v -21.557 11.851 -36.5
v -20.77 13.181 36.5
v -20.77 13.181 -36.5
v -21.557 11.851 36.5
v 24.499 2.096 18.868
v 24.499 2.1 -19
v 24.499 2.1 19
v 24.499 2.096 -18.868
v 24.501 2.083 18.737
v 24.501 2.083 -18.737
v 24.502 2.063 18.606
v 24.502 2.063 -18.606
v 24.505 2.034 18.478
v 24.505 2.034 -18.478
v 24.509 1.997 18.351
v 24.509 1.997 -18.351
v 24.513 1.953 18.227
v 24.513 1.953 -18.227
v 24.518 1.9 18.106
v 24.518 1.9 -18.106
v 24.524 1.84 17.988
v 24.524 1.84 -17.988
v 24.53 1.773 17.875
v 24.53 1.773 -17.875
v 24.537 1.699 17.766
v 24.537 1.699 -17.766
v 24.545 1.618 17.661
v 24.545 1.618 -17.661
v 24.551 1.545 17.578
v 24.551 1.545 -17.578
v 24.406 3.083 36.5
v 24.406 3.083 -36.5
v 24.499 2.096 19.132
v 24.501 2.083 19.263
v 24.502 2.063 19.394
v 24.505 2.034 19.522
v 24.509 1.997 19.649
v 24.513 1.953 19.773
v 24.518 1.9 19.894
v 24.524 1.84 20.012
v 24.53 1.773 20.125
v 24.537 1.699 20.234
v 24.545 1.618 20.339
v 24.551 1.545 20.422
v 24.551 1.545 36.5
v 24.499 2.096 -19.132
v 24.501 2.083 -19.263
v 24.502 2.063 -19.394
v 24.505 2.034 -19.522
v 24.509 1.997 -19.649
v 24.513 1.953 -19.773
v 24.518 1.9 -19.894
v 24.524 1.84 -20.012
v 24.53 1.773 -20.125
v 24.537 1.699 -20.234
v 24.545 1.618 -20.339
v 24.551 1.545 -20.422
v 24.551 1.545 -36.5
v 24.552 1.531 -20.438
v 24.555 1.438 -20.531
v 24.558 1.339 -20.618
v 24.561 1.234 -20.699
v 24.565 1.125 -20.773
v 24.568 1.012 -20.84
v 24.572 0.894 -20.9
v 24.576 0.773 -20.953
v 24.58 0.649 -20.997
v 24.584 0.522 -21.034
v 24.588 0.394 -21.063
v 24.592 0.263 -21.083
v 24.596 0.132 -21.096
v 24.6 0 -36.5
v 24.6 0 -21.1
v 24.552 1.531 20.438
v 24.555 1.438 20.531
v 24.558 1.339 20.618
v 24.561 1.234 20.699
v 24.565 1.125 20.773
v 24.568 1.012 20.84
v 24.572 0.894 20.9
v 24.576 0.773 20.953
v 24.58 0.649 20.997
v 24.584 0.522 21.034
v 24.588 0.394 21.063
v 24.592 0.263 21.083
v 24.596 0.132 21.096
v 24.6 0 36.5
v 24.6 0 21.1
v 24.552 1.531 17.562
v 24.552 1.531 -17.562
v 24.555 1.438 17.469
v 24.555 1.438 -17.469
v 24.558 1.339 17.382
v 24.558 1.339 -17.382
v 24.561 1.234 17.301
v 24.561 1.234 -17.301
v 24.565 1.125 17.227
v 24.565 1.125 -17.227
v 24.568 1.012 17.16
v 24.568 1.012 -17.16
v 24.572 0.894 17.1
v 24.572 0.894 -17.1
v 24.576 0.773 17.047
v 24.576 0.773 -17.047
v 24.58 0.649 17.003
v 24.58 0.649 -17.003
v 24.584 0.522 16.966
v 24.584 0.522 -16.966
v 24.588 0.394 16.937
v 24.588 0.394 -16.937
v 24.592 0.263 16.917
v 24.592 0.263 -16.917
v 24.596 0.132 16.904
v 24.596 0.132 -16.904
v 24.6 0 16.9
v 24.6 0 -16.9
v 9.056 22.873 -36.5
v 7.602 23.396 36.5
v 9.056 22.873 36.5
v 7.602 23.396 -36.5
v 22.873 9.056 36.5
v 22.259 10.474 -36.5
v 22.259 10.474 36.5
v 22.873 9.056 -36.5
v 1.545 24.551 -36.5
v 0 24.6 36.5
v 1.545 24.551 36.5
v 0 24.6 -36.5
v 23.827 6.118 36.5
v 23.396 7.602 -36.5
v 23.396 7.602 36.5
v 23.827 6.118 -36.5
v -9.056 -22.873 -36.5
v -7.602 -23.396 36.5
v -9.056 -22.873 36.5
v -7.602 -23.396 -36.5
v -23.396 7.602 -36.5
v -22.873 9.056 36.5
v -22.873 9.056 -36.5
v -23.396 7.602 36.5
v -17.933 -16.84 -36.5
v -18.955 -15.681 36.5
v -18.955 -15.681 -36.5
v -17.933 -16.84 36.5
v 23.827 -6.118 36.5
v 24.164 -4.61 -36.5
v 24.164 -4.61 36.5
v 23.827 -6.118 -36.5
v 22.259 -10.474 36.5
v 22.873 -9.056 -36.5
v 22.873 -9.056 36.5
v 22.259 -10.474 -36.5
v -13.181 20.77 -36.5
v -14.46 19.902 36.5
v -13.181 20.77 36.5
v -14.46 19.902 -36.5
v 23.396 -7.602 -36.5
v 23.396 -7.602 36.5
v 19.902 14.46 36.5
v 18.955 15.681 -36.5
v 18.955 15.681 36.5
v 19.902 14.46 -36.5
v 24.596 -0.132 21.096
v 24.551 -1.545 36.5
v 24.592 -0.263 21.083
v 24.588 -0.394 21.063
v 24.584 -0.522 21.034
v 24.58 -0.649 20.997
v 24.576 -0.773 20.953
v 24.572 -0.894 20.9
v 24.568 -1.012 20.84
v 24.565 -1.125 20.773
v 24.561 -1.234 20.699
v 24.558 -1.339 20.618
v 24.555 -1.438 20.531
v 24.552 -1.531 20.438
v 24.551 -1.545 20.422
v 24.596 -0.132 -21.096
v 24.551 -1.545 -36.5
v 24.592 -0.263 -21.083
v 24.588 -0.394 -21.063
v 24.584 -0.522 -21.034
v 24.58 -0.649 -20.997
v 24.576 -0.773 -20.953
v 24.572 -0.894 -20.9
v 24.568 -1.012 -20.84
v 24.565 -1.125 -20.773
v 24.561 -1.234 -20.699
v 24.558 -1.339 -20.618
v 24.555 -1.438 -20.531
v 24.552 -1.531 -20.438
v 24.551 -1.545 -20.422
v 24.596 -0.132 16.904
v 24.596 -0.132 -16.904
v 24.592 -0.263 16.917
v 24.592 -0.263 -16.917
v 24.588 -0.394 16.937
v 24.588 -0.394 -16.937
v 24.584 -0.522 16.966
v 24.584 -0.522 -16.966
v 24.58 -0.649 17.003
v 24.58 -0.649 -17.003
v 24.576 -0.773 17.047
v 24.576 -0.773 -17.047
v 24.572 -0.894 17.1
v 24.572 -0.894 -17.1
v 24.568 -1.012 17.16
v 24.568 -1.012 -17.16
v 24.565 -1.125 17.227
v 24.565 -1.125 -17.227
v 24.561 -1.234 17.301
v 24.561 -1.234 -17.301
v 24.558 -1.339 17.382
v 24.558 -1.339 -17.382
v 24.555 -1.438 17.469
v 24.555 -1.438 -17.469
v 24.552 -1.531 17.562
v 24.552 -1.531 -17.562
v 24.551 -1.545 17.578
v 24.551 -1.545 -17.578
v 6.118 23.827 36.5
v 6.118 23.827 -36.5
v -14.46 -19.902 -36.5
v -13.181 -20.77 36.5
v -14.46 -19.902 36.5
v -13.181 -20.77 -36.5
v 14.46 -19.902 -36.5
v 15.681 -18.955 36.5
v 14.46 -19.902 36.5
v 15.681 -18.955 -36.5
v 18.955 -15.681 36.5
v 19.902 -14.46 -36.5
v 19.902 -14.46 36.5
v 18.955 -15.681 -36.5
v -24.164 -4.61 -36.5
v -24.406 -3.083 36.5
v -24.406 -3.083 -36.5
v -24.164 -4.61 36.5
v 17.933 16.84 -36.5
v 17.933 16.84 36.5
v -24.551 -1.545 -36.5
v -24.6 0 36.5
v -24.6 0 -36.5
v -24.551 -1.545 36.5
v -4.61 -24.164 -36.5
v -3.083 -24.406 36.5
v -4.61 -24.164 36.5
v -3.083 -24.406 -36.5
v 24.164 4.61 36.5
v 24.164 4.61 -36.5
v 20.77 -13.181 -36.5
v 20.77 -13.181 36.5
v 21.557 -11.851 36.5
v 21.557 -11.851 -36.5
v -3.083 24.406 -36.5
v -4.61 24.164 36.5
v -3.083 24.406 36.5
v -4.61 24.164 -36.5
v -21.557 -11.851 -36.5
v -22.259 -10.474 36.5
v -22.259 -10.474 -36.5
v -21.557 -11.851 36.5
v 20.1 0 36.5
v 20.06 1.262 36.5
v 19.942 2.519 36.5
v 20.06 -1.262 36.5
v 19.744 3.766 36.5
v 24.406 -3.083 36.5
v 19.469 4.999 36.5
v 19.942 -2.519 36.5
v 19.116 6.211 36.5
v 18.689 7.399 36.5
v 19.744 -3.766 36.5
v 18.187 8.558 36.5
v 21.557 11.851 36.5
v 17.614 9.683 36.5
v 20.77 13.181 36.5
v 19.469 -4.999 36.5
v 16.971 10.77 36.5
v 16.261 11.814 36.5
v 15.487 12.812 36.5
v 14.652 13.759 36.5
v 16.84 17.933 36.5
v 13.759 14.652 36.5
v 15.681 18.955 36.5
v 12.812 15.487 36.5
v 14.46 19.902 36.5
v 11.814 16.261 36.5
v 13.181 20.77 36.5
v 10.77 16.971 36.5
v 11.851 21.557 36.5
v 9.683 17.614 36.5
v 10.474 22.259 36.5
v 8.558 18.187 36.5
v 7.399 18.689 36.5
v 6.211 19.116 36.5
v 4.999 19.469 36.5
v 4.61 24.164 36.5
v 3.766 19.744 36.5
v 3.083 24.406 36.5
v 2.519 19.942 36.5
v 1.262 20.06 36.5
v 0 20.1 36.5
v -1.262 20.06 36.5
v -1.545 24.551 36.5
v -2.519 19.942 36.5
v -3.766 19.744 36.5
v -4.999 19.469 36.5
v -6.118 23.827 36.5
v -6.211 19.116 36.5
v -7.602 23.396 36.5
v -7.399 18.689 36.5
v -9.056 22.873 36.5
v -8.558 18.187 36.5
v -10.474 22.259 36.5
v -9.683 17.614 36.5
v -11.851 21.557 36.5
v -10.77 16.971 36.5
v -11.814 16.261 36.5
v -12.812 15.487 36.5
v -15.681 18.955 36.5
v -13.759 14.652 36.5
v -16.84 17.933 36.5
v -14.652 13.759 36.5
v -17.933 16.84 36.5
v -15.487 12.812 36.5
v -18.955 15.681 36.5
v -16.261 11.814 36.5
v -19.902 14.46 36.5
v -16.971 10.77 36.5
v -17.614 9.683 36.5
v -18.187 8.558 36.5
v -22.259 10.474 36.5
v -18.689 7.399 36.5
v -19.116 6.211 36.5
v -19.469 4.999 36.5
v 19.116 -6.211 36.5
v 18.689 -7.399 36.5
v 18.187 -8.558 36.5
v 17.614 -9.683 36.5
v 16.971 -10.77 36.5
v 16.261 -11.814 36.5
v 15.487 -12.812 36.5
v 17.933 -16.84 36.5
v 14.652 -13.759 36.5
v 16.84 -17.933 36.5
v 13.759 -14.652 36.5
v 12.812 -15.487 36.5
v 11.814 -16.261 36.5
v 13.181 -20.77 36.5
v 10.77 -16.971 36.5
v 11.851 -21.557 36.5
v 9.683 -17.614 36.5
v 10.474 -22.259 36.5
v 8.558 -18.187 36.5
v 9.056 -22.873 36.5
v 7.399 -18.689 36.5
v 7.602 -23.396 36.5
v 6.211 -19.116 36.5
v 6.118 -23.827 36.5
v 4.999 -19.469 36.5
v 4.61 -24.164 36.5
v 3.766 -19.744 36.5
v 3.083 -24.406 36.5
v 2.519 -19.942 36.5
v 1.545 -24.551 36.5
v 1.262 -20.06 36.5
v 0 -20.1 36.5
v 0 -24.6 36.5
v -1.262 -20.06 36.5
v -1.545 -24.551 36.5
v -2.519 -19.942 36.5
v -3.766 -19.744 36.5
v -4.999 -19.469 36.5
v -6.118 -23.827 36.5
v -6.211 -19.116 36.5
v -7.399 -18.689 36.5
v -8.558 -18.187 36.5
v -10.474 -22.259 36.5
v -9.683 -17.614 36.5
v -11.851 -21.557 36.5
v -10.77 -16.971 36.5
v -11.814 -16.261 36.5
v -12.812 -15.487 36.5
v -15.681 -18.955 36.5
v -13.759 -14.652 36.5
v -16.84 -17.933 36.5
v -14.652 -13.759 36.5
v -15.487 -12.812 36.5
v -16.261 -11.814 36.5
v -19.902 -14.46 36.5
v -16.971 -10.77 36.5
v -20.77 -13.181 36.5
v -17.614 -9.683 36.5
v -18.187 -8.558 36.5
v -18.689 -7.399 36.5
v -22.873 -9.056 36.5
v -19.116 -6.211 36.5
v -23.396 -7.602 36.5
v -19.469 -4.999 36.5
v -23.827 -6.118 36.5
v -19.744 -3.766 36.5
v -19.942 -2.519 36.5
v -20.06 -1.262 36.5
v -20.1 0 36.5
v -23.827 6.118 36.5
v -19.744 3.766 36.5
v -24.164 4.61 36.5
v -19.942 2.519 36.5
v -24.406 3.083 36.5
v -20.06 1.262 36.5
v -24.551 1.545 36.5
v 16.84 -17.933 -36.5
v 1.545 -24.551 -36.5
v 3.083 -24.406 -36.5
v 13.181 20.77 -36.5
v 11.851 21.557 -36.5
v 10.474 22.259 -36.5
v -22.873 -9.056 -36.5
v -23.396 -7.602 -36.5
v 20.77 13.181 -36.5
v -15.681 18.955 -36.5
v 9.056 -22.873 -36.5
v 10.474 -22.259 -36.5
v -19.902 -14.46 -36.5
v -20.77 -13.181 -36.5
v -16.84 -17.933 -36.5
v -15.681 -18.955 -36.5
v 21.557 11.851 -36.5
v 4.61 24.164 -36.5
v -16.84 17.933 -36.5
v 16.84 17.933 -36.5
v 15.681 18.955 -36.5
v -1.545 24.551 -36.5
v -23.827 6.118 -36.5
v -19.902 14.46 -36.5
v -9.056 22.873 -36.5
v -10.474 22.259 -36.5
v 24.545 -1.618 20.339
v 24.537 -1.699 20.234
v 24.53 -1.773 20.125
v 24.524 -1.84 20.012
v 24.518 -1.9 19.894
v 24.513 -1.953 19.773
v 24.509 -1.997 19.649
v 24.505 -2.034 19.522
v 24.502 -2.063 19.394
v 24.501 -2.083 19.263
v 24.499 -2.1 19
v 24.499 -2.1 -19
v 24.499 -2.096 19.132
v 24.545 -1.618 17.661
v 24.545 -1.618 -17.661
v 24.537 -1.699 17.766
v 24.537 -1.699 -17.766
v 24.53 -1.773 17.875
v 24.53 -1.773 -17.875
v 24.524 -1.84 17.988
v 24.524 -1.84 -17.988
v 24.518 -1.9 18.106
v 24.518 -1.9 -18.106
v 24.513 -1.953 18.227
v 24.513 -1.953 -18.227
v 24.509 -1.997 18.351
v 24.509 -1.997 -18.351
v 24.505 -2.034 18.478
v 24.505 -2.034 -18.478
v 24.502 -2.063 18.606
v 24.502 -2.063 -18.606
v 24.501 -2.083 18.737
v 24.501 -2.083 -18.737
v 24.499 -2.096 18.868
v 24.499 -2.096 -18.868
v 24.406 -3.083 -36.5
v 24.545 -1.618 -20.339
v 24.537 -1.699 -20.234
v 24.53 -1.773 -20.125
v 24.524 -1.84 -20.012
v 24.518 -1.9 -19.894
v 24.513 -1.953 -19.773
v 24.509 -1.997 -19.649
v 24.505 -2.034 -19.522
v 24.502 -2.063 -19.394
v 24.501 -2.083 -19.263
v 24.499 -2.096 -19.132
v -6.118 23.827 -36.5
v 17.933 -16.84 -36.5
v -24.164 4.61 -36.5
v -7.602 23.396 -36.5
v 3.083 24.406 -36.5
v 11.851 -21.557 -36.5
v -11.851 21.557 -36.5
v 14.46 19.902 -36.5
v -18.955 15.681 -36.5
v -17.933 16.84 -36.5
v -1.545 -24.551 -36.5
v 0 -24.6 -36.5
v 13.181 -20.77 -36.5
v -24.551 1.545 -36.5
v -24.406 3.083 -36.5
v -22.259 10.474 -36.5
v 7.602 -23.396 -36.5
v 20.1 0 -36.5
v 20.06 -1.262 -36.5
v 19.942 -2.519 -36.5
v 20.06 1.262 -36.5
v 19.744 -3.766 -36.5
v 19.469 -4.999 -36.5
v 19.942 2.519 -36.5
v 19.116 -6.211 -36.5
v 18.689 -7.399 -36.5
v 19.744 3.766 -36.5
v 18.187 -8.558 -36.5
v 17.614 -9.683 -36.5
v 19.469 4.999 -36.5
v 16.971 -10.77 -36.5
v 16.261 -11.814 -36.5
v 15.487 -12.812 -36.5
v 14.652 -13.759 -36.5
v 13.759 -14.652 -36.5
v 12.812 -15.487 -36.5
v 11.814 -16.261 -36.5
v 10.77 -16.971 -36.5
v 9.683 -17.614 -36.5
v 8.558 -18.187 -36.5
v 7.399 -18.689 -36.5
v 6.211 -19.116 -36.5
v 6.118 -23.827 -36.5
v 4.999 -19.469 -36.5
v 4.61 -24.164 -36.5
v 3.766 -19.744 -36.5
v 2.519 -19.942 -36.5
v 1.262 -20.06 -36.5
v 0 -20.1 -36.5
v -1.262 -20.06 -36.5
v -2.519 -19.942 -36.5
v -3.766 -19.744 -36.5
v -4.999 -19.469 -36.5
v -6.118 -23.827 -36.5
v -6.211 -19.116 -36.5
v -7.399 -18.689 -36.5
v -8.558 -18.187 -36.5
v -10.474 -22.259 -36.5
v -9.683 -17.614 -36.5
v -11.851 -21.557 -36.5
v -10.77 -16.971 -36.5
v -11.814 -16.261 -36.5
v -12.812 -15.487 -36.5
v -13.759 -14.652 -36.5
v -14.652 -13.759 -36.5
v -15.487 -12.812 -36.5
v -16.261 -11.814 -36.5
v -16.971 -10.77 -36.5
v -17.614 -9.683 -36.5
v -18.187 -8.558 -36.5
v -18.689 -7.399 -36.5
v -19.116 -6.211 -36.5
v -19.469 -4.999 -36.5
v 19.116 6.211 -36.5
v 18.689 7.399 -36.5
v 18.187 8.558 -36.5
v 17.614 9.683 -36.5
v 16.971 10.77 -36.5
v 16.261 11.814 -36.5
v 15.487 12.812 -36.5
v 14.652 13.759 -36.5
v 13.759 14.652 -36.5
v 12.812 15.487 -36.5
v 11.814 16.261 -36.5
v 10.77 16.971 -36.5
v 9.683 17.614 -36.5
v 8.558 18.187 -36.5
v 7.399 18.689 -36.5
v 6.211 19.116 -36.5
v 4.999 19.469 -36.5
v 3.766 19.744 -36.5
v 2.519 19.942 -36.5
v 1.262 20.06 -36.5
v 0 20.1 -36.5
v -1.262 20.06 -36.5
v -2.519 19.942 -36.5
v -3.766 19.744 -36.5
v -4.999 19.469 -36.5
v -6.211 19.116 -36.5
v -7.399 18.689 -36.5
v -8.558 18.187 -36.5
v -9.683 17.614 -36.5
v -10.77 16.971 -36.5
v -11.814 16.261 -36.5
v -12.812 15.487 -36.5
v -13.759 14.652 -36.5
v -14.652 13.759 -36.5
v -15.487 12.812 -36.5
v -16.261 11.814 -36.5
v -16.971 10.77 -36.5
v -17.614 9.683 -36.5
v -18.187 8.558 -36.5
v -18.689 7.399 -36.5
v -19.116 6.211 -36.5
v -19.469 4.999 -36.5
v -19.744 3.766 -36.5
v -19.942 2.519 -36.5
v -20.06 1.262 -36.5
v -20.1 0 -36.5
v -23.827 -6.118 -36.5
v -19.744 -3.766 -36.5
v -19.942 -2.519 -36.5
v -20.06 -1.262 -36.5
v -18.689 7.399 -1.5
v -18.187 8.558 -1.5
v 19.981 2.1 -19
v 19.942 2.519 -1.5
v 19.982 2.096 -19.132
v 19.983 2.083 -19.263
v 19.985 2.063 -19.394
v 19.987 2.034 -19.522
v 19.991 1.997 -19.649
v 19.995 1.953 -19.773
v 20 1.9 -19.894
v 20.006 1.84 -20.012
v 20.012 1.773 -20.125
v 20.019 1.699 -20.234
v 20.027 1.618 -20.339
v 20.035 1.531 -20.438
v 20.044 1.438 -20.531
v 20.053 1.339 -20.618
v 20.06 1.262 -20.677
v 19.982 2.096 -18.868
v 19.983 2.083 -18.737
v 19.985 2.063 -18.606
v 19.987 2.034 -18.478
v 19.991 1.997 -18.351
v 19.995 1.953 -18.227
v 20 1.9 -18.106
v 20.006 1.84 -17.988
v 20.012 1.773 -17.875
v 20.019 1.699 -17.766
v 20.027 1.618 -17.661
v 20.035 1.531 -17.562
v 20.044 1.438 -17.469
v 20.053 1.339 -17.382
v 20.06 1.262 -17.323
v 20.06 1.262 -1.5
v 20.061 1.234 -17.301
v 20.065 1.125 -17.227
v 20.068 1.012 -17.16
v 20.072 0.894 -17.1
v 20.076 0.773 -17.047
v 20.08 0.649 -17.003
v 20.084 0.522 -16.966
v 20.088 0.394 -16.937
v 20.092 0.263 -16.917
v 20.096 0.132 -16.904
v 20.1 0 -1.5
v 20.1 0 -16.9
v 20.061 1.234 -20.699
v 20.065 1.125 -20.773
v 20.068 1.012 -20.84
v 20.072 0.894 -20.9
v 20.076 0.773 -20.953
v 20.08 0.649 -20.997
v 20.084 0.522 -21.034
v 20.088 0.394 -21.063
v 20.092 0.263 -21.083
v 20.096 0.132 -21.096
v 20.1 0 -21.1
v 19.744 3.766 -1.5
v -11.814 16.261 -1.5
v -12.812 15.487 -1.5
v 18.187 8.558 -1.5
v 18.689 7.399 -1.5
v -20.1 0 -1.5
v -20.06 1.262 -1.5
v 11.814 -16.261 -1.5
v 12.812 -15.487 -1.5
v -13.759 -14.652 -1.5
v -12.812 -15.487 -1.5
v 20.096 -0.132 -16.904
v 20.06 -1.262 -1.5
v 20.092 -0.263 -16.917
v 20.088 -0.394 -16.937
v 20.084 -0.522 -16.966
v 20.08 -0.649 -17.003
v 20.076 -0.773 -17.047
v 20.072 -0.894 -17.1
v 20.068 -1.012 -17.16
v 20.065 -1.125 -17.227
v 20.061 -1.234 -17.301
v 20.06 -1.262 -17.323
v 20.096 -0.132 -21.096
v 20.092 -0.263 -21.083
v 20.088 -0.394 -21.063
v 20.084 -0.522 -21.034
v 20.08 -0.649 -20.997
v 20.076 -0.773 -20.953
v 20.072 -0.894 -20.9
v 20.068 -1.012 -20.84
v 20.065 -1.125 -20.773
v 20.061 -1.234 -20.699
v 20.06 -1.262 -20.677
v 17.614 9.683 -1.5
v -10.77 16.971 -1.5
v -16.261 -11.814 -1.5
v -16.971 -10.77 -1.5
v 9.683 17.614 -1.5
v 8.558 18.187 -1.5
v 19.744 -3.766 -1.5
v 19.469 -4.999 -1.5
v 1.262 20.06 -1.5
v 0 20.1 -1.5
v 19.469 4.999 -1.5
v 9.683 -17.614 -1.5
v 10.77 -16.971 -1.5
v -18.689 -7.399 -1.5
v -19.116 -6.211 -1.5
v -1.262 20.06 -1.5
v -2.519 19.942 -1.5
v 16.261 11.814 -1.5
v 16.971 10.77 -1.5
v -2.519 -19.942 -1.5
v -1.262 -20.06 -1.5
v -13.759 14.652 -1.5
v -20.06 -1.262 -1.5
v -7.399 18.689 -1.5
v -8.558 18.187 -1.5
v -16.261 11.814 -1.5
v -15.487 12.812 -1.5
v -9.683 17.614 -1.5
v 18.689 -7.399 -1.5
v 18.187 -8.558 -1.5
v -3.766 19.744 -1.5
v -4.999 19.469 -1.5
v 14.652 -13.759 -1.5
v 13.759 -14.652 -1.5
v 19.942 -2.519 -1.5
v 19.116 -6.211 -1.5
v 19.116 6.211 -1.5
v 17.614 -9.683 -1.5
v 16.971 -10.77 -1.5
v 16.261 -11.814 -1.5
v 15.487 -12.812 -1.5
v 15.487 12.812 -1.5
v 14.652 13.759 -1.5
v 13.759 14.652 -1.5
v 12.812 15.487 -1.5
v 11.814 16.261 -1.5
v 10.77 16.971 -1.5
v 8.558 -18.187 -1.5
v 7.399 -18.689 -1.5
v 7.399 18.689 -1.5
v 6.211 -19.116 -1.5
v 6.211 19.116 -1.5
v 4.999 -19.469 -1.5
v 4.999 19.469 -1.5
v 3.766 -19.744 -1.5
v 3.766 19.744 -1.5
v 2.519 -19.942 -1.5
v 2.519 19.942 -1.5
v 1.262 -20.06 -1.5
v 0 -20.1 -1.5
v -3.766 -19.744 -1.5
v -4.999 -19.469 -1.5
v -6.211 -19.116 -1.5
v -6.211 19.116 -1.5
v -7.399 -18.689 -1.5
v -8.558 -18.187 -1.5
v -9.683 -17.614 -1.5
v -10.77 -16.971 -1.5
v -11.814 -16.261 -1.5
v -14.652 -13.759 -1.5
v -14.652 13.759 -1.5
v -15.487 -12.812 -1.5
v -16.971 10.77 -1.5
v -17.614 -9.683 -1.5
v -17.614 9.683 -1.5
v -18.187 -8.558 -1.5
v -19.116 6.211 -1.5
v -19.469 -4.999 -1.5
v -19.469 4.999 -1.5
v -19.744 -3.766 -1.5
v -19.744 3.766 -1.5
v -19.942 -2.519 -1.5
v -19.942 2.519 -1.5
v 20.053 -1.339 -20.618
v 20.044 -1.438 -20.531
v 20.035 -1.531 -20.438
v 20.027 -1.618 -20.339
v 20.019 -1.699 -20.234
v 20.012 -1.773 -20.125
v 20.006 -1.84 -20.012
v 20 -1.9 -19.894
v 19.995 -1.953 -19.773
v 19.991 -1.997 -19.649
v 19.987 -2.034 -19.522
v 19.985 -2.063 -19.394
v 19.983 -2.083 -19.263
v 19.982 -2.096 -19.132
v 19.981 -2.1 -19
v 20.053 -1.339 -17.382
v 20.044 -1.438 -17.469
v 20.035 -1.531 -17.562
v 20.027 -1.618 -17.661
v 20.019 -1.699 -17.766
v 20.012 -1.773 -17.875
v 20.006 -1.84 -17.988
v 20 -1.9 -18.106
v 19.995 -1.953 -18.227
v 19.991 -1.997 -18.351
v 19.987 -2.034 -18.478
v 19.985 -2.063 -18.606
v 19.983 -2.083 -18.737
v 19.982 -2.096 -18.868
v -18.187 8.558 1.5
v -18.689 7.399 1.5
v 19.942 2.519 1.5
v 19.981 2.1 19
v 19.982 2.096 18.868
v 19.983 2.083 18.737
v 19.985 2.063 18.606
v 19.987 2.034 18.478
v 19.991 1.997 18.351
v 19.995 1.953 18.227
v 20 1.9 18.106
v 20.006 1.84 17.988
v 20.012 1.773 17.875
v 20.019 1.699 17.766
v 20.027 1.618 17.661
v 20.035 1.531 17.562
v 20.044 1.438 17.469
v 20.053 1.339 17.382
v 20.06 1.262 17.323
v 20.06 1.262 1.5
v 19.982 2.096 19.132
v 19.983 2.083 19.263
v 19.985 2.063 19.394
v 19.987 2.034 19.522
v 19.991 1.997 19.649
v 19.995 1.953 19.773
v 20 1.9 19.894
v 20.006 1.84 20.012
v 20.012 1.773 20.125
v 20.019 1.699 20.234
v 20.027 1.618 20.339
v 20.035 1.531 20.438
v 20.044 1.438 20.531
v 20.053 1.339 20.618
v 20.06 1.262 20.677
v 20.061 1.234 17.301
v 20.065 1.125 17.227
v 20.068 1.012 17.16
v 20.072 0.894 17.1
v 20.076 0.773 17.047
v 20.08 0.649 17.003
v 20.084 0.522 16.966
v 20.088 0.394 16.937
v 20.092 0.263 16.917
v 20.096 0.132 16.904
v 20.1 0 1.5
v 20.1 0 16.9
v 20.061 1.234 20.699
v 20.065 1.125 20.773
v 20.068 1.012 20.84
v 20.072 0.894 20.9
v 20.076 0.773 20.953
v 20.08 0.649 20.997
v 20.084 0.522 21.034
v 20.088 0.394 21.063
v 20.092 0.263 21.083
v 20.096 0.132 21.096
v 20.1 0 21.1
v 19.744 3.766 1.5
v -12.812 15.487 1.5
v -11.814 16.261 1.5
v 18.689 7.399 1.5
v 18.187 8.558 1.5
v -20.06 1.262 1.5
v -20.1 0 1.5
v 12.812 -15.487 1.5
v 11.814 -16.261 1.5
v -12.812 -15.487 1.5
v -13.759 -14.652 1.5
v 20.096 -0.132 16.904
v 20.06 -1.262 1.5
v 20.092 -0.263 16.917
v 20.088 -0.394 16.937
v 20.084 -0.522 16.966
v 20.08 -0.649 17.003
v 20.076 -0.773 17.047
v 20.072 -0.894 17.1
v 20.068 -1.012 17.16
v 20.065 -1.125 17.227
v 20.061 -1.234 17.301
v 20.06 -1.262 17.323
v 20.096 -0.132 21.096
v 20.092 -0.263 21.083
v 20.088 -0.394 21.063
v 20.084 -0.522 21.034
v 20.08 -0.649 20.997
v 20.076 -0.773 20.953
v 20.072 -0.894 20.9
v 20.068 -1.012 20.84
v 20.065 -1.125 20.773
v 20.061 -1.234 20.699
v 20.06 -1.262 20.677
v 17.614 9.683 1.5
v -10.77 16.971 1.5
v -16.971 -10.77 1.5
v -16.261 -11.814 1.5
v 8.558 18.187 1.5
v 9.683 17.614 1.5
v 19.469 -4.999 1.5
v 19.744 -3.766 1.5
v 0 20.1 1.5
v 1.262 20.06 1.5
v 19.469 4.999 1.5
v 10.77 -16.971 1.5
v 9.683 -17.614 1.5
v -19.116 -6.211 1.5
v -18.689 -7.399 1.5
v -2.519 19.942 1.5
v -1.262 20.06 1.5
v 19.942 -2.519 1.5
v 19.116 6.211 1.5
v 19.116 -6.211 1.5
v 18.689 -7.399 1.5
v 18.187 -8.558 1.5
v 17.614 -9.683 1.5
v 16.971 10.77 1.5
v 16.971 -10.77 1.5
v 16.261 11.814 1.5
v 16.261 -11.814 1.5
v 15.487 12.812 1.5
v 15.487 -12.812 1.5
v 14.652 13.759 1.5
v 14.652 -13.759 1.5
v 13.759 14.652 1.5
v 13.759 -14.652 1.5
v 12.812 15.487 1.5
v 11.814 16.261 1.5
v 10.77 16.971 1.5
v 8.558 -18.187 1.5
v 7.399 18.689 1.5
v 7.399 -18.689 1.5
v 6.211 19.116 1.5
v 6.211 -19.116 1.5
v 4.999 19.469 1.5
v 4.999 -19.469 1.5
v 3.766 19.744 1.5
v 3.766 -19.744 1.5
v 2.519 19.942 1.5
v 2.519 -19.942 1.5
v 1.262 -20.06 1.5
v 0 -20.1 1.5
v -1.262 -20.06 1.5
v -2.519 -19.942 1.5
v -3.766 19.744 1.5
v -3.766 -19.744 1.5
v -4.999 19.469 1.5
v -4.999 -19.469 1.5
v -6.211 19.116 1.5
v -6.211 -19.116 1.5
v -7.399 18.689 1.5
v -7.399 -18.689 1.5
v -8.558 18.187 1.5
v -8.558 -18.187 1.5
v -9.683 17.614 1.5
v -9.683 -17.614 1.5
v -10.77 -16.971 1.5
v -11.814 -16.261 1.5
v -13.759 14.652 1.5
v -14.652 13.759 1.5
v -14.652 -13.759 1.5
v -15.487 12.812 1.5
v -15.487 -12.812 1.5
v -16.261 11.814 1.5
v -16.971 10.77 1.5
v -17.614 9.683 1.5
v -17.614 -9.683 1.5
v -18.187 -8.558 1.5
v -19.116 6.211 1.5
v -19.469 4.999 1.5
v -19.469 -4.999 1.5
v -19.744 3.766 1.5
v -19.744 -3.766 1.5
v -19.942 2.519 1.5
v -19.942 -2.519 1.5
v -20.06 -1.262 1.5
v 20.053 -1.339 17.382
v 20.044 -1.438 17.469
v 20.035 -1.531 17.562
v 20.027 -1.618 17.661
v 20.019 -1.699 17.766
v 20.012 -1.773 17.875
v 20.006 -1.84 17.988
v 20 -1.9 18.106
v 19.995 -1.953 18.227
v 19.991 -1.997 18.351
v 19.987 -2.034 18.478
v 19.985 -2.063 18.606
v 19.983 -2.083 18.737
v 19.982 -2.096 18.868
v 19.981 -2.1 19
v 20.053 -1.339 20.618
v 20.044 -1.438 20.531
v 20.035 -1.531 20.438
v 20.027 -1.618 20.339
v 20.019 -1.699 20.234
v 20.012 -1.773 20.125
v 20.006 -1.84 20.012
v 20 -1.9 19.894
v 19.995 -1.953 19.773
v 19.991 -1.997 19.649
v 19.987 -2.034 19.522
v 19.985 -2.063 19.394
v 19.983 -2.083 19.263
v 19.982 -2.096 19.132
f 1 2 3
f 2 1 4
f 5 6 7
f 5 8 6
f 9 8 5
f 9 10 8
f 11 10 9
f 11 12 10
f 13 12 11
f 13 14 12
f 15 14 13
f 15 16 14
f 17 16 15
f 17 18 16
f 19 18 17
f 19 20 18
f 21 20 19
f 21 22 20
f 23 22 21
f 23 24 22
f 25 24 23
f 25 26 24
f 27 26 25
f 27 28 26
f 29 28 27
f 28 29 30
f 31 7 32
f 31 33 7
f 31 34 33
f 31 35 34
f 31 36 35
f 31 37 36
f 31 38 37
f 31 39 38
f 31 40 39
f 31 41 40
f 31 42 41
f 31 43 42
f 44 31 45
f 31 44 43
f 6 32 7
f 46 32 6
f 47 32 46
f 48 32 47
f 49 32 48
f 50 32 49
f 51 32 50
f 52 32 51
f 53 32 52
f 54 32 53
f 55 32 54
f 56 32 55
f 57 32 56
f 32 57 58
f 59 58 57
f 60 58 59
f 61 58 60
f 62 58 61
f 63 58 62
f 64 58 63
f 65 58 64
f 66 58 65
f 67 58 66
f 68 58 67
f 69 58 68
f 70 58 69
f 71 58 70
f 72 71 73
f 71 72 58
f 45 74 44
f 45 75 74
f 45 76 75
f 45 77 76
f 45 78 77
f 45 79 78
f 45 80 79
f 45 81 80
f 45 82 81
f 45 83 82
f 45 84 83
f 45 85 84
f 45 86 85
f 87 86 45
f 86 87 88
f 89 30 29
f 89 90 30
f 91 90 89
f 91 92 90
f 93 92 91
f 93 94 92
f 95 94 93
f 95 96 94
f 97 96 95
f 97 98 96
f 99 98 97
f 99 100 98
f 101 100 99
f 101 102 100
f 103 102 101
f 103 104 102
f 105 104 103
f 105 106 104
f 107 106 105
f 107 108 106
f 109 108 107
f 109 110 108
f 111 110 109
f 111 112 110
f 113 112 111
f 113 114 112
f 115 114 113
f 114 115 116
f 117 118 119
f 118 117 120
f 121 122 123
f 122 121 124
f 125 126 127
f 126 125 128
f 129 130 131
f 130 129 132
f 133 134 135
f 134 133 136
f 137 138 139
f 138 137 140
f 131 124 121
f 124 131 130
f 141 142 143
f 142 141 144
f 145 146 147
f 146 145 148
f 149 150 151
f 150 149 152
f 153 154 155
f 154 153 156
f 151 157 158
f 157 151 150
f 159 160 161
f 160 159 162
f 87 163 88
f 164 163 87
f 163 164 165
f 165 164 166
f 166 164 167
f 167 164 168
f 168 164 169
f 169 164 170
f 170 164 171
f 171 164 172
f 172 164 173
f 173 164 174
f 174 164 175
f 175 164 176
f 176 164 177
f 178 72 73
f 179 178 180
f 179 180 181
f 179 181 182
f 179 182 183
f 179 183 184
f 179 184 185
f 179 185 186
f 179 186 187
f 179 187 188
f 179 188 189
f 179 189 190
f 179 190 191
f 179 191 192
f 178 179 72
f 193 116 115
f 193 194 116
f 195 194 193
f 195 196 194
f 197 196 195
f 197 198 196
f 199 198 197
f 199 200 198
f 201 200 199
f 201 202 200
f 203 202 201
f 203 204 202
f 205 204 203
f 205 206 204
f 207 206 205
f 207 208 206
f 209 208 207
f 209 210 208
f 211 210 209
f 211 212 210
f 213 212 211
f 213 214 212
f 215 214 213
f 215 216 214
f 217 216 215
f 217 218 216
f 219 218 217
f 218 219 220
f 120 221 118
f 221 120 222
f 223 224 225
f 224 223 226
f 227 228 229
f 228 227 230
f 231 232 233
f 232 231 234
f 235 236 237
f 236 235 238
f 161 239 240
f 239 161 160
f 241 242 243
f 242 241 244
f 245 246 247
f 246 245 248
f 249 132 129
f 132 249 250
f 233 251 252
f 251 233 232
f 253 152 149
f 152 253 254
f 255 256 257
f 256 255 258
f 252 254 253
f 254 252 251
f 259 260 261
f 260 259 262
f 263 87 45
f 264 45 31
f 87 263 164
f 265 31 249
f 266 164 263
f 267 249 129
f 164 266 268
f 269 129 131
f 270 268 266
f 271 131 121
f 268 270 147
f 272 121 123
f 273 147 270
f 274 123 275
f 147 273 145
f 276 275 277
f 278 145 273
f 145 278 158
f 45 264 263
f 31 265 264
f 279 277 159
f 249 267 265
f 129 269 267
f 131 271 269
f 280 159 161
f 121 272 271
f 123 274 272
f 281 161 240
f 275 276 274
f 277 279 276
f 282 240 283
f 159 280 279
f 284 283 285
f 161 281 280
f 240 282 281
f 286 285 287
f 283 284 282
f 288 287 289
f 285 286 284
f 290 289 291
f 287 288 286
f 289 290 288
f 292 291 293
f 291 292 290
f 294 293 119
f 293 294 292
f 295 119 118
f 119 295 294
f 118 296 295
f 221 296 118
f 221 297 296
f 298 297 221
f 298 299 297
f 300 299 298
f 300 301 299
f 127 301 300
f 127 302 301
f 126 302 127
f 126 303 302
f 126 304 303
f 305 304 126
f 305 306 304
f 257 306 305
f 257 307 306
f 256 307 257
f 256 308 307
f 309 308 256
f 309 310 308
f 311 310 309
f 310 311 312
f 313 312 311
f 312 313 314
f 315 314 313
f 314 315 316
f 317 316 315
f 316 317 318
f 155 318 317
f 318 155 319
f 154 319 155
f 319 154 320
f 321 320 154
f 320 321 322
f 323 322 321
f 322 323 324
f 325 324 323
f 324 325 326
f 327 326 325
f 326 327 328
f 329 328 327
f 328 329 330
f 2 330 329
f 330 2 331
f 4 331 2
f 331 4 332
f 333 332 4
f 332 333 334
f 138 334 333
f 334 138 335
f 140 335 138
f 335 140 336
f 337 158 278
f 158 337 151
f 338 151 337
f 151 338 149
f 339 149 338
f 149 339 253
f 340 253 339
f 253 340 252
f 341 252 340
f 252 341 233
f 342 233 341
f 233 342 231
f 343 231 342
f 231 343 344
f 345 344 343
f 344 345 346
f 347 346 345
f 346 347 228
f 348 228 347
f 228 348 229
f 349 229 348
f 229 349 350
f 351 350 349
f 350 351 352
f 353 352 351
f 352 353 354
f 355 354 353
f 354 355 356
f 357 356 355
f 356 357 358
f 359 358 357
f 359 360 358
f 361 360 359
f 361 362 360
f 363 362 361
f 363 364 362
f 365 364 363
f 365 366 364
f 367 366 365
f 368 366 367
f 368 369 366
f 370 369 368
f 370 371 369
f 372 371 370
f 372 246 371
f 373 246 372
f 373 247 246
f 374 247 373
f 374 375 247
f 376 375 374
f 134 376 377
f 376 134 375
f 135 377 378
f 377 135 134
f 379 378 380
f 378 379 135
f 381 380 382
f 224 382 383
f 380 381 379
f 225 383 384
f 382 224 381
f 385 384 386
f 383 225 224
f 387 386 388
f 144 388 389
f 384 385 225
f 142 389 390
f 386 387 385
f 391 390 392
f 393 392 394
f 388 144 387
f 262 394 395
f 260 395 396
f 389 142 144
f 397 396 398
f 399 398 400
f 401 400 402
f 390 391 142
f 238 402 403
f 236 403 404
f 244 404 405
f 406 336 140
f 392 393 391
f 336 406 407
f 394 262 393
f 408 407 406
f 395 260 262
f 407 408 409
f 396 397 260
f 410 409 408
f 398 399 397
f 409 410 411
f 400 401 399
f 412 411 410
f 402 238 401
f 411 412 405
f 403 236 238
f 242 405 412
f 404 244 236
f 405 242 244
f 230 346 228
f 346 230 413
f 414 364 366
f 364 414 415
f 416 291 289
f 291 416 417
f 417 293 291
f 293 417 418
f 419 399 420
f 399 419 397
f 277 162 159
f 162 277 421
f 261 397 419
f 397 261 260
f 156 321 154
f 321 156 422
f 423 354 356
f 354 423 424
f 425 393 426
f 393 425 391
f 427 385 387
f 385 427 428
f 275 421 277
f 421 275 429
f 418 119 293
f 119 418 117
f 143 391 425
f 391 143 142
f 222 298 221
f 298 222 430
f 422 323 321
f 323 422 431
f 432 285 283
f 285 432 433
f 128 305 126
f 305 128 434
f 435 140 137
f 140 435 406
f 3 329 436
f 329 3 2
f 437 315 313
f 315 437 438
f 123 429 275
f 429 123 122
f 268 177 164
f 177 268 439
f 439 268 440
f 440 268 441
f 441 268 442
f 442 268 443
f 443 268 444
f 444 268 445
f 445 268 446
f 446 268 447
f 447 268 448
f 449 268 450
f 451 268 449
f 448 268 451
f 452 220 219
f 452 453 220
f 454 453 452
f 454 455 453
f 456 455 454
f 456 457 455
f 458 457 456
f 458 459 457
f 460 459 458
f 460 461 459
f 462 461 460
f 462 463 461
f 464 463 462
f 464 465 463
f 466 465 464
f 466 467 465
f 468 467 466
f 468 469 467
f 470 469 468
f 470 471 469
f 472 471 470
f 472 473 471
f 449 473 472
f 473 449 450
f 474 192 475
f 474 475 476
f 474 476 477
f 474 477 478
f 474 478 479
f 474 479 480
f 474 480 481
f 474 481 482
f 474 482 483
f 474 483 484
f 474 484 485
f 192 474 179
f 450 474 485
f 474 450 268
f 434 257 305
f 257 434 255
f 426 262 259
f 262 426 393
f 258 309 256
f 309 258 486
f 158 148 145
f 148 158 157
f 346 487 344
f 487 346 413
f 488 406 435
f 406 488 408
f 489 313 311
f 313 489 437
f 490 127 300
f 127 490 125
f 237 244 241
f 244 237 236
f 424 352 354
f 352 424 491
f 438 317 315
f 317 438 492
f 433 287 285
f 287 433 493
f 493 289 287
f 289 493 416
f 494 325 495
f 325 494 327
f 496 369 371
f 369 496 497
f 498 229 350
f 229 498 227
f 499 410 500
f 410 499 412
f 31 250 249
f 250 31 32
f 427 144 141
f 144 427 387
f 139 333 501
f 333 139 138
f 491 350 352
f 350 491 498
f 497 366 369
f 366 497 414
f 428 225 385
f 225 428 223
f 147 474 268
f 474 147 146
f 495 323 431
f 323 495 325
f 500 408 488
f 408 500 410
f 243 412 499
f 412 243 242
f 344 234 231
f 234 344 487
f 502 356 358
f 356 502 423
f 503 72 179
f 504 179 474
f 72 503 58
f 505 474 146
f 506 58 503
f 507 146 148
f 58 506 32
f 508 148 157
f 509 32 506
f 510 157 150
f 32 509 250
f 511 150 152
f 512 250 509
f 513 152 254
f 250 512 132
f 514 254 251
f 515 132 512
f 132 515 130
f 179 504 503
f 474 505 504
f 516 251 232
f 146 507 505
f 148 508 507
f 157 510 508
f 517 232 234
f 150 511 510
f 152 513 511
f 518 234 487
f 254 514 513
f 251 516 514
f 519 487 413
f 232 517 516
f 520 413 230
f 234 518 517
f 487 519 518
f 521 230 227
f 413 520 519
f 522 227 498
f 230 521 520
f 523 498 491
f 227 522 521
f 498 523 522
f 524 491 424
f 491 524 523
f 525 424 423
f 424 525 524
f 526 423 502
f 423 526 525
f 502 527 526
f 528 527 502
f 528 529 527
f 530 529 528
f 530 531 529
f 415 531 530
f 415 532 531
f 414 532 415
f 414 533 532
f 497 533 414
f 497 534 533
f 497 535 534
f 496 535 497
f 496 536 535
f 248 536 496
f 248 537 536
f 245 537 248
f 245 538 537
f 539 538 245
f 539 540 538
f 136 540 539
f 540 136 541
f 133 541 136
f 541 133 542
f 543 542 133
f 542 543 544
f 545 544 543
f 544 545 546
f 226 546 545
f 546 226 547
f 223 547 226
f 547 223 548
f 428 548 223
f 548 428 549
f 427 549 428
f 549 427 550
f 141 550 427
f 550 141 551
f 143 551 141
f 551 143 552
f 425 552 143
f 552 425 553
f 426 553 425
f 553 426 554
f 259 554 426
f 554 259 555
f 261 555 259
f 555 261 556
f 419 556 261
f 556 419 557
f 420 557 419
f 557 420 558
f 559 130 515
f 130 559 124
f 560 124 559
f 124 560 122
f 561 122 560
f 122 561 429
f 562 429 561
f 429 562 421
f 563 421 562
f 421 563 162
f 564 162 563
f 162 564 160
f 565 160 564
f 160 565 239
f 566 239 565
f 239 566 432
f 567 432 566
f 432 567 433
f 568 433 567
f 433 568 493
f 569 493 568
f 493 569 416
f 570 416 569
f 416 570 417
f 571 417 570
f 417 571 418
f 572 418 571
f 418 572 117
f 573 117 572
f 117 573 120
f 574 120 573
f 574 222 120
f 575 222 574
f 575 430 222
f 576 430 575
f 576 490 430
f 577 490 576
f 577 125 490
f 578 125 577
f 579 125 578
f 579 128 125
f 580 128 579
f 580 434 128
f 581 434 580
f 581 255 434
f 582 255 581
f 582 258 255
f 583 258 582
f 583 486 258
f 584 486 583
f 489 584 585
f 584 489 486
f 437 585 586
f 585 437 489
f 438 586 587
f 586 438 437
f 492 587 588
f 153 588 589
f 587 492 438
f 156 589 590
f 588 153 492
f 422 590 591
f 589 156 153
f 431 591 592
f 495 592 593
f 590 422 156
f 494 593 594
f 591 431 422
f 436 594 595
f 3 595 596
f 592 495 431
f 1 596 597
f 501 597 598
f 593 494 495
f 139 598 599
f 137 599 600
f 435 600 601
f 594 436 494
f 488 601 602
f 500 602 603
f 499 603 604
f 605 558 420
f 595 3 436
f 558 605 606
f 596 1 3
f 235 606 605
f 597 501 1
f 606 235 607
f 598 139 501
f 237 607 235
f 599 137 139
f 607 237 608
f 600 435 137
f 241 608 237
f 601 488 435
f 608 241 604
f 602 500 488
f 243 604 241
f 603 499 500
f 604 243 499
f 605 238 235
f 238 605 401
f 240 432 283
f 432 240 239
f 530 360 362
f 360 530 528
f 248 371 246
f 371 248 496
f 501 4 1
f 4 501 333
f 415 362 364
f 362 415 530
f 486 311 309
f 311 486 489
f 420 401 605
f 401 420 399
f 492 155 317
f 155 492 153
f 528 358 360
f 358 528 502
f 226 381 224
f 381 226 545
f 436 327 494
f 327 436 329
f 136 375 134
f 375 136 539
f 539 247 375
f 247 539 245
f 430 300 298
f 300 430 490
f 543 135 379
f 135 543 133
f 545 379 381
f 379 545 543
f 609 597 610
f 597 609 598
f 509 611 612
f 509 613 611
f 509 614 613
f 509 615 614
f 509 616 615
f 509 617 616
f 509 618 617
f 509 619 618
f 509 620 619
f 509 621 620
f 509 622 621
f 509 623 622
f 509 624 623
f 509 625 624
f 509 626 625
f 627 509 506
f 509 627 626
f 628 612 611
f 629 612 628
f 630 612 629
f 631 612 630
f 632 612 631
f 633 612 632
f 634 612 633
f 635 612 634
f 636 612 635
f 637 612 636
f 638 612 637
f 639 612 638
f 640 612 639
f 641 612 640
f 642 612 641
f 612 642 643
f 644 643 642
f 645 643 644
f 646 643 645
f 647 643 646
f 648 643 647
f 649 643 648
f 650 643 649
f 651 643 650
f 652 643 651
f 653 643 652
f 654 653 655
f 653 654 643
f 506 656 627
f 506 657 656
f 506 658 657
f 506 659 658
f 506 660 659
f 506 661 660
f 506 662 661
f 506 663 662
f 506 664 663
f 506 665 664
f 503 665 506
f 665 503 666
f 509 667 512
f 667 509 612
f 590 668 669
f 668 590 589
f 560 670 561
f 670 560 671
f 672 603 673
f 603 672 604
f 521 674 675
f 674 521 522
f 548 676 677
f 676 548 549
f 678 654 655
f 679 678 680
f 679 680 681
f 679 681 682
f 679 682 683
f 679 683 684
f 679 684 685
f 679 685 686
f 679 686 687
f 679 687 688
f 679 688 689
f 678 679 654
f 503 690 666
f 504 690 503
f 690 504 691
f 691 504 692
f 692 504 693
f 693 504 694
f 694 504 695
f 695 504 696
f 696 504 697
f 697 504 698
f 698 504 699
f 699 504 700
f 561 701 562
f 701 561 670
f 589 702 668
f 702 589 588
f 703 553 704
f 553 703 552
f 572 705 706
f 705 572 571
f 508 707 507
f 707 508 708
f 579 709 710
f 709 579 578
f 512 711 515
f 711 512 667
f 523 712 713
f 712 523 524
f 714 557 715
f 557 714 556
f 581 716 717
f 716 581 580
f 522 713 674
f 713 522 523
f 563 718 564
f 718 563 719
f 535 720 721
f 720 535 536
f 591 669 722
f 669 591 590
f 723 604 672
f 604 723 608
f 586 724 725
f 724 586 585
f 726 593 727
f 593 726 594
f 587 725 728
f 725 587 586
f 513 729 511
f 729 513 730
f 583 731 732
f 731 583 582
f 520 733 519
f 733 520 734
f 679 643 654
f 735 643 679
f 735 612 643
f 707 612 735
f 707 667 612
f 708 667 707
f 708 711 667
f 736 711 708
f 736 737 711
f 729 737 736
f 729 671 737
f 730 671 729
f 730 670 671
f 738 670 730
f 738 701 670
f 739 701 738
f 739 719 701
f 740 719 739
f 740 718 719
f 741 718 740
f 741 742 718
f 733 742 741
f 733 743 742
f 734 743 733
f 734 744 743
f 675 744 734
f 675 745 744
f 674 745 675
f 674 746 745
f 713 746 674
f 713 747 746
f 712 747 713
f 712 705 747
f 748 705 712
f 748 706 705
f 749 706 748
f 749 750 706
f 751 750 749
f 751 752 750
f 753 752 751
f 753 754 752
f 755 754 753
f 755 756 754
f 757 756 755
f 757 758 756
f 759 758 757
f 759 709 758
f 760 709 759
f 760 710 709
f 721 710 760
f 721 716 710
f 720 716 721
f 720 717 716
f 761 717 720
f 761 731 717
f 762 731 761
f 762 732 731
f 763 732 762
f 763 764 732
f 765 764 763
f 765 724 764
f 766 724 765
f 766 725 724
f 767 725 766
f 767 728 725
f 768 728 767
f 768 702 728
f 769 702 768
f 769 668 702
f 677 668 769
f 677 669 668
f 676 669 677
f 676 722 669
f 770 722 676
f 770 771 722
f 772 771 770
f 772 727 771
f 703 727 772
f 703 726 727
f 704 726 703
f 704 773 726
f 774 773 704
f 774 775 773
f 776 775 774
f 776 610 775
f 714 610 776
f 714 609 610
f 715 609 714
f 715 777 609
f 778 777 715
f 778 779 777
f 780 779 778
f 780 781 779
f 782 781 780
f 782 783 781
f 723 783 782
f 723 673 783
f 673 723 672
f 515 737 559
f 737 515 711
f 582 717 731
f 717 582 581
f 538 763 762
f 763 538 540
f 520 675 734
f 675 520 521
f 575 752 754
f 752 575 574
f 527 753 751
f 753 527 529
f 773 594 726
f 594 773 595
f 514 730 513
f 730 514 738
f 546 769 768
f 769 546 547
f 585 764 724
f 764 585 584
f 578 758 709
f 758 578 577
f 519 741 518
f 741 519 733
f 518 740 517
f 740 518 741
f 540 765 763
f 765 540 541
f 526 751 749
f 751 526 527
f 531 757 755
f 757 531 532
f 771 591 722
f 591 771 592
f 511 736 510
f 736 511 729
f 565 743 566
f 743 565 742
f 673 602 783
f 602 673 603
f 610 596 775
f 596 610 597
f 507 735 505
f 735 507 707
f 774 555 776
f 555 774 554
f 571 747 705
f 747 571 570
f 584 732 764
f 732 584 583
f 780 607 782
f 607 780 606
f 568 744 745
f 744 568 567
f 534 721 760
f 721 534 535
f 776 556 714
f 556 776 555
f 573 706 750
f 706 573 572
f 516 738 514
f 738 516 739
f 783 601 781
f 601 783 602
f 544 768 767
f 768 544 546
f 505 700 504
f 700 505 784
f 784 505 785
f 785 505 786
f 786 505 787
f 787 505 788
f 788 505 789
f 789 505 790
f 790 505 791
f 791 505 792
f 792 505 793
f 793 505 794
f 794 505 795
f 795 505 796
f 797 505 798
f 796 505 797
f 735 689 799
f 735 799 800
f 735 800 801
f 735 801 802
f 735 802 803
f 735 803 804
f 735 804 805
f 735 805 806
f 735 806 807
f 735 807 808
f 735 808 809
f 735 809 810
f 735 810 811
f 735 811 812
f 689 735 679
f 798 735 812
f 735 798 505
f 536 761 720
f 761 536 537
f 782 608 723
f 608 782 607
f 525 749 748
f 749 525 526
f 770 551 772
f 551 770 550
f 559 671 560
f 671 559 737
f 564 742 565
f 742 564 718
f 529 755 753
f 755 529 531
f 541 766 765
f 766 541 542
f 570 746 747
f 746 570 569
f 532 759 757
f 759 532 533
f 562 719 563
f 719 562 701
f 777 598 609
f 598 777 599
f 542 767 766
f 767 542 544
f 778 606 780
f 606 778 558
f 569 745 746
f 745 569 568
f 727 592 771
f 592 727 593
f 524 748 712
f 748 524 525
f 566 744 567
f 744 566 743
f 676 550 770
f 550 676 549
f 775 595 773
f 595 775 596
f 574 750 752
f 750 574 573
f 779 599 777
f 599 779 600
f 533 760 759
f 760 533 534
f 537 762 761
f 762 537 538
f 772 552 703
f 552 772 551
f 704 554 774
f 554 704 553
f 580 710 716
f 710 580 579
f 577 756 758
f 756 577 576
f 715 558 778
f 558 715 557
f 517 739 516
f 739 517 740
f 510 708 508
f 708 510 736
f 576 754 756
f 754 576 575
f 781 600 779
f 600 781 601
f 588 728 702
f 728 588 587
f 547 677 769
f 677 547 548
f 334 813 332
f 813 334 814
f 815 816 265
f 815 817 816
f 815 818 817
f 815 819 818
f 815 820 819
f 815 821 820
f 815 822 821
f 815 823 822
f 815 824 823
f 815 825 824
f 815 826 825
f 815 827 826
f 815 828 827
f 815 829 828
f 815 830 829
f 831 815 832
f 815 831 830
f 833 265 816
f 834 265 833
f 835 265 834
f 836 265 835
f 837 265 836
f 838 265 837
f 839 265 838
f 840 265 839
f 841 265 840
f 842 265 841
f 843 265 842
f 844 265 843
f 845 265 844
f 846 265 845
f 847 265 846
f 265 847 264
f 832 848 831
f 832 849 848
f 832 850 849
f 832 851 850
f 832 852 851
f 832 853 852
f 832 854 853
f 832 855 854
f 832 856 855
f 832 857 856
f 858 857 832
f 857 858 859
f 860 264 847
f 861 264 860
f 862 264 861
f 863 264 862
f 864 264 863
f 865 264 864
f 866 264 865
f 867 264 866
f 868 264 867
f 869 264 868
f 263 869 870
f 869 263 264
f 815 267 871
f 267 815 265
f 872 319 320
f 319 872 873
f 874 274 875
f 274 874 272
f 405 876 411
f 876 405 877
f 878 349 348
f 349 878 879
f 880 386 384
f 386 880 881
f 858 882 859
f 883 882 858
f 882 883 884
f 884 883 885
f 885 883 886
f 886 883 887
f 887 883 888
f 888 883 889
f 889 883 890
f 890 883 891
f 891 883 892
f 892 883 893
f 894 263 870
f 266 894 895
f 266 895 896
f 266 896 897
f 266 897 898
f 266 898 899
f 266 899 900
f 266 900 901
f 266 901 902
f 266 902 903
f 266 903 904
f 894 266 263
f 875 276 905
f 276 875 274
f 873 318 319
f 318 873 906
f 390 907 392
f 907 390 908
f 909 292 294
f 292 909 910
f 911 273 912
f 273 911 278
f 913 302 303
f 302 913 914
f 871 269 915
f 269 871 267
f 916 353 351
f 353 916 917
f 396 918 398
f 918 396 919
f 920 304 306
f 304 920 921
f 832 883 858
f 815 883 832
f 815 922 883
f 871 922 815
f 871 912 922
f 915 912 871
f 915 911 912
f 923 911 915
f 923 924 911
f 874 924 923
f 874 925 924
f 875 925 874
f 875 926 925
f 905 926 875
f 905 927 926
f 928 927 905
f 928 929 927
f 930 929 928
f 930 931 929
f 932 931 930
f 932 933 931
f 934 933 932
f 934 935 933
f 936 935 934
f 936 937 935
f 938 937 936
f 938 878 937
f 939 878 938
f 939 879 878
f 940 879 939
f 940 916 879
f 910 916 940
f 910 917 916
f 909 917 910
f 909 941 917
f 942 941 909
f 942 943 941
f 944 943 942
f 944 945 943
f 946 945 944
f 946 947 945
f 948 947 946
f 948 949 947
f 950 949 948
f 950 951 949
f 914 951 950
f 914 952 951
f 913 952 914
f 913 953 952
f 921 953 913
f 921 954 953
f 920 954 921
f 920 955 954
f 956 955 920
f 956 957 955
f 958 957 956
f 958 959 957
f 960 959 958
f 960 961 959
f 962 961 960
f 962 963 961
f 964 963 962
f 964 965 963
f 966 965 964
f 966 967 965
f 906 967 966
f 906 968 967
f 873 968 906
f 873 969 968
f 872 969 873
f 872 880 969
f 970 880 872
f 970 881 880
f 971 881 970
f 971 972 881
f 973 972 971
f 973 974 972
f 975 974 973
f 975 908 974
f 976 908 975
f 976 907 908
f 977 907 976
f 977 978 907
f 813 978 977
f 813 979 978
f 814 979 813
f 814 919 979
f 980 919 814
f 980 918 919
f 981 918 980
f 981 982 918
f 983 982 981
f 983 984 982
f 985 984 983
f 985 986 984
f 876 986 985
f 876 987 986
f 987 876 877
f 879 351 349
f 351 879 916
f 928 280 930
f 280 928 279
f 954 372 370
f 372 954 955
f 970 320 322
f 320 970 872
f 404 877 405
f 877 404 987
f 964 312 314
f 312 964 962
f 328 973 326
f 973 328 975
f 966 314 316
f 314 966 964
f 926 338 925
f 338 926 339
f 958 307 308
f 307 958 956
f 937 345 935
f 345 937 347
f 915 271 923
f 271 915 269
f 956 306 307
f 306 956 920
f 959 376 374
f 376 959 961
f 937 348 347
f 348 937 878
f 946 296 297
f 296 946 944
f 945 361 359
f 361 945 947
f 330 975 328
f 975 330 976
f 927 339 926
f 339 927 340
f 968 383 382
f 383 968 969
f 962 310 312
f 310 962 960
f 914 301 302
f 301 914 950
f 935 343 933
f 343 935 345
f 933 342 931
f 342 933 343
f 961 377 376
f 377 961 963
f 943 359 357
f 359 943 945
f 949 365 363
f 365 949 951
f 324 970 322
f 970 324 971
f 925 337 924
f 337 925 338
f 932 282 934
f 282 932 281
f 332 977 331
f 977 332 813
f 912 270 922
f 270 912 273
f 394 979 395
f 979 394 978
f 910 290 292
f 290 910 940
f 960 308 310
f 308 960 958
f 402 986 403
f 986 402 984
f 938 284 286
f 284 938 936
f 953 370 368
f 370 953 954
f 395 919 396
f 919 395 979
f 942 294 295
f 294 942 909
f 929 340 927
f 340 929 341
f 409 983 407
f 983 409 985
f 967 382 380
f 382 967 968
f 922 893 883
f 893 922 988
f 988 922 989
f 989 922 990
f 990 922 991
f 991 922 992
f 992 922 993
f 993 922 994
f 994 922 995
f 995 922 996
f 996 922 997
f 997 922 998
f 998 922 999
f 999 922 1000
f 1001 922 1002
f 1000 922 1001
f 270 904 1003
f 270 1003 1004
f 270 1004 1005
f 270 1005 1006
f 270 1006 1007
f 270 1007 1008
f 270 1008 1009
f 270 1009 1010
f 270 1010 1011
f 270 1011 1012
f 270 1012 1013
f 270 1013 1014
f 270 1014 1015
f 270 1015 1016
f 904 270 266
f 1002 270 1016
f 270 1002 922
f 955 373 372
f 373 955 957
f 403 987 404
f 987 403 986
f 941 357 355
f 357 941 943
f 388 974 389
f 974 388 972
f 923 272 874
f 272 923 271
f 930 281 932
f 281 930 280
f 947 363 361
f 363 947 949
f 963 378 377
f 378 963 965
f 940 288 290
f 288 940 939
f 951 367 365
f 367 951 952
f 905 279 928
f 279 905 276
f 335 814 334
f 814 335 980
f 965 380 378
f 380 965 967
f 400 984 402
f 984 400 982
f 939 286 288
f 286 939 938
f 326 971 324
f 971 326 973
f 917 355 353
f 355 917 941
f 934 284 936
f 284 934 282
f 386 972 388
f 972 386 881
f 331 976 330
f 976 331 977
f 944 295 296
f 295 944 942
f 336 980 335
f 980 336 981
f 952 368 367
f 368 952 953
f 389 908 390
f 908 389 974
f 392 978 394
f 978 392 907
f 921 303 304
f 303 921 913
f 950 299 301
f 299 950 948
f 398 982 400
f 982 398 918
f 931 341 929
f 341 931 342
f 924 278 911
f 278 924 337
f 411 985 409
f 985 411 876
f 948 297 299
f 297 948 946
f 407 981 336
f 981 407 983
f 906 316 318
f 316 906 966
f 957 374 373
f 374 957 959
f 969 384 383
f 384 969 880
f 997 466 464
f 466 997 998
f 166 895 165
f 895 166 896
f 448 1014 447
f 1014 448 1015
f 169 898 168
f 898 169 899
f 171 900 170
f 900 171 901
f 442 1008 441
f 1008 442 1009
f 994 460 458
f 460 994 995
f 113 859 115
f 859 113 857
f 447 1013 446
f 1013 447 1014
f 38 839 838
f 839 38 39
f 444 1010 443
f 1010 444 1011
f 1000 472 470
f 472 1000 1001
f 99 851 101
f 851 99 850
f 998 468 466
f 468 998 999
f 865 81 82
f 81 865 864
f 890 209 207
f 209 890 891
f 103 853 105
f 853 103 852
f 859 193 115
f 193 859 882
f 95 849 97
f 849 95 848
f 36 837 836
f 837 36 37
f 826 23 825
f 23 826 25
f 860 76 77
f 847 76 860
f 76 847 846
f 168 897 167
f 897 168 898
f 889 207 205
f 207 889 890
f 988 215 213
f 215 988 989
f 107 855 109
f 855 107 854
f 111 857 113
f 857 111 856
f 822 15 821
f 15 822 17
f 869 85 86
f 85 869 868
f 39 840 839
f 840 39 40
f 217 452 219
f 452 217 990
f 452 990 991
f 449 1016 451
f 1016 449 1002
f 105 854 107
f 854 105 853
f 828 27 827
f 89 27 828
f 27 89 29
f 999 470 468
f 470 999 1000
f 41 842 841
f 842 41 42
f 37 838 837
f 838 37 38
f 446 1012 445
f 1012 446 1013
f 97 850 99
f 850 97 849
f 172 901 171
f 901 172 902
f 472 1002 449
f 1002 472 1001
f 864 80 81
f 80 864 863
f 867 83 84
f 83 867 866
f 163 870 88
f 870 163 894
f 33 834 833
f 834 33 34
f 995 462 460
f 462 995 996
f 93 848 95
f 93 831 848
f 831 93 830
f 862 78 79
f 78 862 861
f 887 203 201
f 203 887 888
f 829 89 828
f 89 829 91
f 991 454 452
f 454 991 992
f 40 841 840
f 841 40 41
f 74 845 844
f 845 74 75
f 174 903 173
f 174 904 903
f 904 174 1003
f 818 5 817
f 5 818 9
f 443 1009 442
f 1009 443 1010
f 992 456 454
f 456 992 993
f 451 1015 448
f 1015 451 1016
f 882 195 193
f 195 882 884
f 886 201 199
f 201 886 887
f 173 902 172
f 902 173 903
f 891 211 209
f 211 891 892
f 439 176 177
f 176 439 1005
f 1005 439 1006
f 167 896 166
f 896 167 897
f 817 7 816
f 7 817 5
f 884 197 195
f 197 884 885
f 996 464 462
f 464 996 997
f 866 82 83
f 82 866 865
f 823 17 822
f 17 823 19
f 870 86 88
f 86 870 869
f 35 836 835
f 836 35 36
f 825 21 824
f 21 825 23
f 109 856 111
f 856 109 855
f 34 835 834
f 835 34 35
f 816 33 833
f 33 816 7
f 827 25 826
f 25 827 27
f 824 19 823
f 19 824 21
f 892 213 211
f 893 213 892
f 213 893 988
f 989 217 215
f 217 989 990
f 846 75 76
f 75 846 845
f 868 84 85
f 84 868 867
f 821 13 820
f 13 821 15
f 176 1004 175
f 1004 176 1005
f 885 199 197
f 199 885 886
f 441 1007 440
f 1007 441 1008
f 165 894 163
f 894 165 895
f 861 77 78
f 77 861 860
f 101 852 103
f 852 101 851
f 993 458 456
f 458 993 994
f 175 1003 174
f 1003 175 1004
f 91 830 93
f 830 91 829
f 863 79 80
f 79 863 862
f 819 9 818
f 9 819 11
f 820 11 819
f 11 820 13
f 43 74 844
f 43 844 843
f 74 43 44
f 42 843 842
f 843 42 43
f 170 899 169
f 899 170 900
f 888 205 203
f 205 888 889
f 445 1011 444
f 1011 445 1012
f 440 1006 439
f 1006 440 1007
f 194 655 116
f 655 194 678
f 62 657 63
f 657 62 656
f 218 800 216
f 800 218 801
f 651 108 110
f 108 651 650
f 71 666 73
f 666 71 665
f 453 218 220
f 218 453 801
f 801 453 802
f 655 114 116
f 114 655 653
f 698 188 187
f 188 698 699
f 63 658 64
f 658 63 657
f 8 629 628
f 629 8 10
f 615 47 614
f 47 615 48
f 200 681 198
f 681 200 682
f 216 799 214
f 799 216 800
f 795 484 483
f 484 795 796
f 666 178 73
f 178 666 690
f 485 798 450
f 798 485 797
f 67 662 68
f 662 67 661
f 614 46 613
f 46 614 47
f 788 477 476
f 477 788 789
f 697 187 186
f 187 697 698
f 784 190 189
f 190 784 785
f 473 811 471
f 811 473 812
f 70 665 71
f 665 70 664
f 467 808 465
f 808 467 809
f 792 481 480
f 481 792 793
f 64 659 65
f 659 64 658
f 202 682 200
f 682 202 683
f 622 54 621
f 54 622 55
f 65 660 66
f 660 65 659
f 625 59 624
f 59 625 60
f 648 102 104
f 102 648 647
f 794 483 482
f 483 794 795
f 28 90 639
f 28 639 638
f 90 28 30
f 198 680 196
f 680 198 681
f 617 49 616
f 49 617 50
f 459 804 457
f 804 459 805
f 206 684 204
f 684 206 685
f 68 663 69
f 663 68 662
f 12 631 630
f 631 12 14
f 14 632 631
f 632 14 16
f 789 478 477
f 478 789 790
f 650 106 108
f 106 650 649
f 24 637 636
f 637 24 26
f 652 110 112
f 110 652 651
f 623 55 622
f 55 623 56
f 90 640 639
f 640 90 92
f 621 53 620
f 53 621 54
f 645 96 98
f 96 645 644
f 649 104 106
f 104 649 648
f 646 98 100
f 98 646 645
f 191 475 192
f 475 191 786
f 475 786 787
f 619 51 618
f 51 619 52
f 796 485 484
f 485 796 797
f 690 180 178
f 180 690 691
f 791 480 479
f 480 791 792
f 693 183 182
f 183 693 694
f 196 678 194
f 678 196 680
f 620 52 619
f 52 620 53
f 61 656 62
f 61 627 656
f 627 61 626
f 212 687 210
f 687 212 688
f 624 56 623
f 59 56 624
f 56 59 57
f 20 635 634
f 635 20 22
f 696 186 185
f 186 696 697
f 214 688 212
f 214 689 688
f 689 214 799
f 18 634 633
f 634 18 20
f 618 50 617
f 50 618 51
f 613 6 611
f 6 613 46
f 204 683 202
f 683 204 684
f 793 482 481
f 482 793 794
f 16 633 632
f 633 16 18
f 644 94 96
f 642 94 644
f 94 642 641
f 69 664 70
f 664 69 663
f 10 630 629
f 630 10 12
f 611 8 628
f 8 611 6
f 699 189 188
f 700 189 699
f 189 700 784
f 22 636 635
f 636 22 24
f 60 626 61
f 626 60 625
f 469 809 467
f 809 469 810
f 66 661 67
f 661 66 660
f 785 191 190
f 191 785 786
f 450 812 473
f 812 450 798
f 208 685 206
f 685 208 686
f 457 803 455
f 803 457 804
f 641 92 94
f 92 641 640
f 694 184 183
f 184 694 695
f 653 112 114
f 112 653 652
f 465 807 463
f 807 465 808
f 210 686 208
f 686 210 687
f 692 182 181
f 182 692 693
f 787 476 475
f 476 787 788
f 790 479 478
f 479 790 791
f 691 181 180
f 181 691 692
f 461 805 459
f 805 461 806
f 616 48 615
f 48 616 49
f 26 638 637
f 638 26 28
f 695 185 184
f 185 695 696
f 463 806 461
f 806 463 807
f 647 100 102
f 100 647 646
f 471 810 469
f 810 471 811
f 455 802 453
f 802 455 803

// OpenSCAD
/*
 * Modulares OpenSCAD Modell: 180-Grad Geradverbinder (Rohrverlängerung)
 * Funktion: Verbindet zwei Rohre in einer Linie mit innerem Mittelanschlag.
 */

$fn = 100;

// --- PARAMETER ---
rohr_nennmass = 40.0;                         // 20, 25, 30, 40 mm
toleranz = 0.2;
innen_durchmesser = rohr_nennmass + toleranz;
wanddicke = (rohr_nennmass <= 25) ? 3.5 : (rohr_nennmass <= 30) ? 4.0 : 4.5;
aussen_durchmesser = innen_durchmesser + (wanddicke * 2);
muffen_laenge = max(22.0, round(rohr_nennmass * 0.875)); // Einstecktiefe pro Seite
anschlag_dicke = 3.0;
gesamt_laenge = (muffen_laenge * 2) + anschlag_dicke;

// Bohrungen für die Fixierschrauben
loch_durchmesser_rohr = (rohr_nennmass <= 25) ? 3.2 : 4.2;

// --- HAUPTBAUGRUPPE ---
verbinder_gerade();

module verbinder_gerade() {
    difference() {
        // Äußerer Zylinder entlang Z
        cylinder(d=aussen_durchmesser, h=gesamt_laenge, center=true);

        // Untere Rohr-Aussparung (lässt in der Mitte anschlag_dicke stehen)
        translate([0, 0, -(anschlag_dicke/2) - muffen_laenge - 1])
            cylinder(d=innen_durchmesser, h=muffen_laenge + 1);

        // Obere Rohr-Aussparung
        translate([0, 0, anschlag_dicke/2])
            cylinder(d=innen_durchmesser, h=muffen_laenge + 1);

        // Fixierbohrungen je Seite
        translate([aussen_durchmesser/2, 0, (anschlag_dicke/2) + (muffen_laenge/2)])
            rotate([0, 90, 0])
            cylinder(d=loch_durchmesser_rohr, h=wanddicke + 5, center=true);
        translate([aussen_durchmesser/2, 0, -(anschlag_dicke/2) - (muffen_laenge/2)])
            rotate([0, 90, 0])
            cylinder(d=loch_durchmesser_rohr, h=wanddicke + 5, center=true);
    }
}
